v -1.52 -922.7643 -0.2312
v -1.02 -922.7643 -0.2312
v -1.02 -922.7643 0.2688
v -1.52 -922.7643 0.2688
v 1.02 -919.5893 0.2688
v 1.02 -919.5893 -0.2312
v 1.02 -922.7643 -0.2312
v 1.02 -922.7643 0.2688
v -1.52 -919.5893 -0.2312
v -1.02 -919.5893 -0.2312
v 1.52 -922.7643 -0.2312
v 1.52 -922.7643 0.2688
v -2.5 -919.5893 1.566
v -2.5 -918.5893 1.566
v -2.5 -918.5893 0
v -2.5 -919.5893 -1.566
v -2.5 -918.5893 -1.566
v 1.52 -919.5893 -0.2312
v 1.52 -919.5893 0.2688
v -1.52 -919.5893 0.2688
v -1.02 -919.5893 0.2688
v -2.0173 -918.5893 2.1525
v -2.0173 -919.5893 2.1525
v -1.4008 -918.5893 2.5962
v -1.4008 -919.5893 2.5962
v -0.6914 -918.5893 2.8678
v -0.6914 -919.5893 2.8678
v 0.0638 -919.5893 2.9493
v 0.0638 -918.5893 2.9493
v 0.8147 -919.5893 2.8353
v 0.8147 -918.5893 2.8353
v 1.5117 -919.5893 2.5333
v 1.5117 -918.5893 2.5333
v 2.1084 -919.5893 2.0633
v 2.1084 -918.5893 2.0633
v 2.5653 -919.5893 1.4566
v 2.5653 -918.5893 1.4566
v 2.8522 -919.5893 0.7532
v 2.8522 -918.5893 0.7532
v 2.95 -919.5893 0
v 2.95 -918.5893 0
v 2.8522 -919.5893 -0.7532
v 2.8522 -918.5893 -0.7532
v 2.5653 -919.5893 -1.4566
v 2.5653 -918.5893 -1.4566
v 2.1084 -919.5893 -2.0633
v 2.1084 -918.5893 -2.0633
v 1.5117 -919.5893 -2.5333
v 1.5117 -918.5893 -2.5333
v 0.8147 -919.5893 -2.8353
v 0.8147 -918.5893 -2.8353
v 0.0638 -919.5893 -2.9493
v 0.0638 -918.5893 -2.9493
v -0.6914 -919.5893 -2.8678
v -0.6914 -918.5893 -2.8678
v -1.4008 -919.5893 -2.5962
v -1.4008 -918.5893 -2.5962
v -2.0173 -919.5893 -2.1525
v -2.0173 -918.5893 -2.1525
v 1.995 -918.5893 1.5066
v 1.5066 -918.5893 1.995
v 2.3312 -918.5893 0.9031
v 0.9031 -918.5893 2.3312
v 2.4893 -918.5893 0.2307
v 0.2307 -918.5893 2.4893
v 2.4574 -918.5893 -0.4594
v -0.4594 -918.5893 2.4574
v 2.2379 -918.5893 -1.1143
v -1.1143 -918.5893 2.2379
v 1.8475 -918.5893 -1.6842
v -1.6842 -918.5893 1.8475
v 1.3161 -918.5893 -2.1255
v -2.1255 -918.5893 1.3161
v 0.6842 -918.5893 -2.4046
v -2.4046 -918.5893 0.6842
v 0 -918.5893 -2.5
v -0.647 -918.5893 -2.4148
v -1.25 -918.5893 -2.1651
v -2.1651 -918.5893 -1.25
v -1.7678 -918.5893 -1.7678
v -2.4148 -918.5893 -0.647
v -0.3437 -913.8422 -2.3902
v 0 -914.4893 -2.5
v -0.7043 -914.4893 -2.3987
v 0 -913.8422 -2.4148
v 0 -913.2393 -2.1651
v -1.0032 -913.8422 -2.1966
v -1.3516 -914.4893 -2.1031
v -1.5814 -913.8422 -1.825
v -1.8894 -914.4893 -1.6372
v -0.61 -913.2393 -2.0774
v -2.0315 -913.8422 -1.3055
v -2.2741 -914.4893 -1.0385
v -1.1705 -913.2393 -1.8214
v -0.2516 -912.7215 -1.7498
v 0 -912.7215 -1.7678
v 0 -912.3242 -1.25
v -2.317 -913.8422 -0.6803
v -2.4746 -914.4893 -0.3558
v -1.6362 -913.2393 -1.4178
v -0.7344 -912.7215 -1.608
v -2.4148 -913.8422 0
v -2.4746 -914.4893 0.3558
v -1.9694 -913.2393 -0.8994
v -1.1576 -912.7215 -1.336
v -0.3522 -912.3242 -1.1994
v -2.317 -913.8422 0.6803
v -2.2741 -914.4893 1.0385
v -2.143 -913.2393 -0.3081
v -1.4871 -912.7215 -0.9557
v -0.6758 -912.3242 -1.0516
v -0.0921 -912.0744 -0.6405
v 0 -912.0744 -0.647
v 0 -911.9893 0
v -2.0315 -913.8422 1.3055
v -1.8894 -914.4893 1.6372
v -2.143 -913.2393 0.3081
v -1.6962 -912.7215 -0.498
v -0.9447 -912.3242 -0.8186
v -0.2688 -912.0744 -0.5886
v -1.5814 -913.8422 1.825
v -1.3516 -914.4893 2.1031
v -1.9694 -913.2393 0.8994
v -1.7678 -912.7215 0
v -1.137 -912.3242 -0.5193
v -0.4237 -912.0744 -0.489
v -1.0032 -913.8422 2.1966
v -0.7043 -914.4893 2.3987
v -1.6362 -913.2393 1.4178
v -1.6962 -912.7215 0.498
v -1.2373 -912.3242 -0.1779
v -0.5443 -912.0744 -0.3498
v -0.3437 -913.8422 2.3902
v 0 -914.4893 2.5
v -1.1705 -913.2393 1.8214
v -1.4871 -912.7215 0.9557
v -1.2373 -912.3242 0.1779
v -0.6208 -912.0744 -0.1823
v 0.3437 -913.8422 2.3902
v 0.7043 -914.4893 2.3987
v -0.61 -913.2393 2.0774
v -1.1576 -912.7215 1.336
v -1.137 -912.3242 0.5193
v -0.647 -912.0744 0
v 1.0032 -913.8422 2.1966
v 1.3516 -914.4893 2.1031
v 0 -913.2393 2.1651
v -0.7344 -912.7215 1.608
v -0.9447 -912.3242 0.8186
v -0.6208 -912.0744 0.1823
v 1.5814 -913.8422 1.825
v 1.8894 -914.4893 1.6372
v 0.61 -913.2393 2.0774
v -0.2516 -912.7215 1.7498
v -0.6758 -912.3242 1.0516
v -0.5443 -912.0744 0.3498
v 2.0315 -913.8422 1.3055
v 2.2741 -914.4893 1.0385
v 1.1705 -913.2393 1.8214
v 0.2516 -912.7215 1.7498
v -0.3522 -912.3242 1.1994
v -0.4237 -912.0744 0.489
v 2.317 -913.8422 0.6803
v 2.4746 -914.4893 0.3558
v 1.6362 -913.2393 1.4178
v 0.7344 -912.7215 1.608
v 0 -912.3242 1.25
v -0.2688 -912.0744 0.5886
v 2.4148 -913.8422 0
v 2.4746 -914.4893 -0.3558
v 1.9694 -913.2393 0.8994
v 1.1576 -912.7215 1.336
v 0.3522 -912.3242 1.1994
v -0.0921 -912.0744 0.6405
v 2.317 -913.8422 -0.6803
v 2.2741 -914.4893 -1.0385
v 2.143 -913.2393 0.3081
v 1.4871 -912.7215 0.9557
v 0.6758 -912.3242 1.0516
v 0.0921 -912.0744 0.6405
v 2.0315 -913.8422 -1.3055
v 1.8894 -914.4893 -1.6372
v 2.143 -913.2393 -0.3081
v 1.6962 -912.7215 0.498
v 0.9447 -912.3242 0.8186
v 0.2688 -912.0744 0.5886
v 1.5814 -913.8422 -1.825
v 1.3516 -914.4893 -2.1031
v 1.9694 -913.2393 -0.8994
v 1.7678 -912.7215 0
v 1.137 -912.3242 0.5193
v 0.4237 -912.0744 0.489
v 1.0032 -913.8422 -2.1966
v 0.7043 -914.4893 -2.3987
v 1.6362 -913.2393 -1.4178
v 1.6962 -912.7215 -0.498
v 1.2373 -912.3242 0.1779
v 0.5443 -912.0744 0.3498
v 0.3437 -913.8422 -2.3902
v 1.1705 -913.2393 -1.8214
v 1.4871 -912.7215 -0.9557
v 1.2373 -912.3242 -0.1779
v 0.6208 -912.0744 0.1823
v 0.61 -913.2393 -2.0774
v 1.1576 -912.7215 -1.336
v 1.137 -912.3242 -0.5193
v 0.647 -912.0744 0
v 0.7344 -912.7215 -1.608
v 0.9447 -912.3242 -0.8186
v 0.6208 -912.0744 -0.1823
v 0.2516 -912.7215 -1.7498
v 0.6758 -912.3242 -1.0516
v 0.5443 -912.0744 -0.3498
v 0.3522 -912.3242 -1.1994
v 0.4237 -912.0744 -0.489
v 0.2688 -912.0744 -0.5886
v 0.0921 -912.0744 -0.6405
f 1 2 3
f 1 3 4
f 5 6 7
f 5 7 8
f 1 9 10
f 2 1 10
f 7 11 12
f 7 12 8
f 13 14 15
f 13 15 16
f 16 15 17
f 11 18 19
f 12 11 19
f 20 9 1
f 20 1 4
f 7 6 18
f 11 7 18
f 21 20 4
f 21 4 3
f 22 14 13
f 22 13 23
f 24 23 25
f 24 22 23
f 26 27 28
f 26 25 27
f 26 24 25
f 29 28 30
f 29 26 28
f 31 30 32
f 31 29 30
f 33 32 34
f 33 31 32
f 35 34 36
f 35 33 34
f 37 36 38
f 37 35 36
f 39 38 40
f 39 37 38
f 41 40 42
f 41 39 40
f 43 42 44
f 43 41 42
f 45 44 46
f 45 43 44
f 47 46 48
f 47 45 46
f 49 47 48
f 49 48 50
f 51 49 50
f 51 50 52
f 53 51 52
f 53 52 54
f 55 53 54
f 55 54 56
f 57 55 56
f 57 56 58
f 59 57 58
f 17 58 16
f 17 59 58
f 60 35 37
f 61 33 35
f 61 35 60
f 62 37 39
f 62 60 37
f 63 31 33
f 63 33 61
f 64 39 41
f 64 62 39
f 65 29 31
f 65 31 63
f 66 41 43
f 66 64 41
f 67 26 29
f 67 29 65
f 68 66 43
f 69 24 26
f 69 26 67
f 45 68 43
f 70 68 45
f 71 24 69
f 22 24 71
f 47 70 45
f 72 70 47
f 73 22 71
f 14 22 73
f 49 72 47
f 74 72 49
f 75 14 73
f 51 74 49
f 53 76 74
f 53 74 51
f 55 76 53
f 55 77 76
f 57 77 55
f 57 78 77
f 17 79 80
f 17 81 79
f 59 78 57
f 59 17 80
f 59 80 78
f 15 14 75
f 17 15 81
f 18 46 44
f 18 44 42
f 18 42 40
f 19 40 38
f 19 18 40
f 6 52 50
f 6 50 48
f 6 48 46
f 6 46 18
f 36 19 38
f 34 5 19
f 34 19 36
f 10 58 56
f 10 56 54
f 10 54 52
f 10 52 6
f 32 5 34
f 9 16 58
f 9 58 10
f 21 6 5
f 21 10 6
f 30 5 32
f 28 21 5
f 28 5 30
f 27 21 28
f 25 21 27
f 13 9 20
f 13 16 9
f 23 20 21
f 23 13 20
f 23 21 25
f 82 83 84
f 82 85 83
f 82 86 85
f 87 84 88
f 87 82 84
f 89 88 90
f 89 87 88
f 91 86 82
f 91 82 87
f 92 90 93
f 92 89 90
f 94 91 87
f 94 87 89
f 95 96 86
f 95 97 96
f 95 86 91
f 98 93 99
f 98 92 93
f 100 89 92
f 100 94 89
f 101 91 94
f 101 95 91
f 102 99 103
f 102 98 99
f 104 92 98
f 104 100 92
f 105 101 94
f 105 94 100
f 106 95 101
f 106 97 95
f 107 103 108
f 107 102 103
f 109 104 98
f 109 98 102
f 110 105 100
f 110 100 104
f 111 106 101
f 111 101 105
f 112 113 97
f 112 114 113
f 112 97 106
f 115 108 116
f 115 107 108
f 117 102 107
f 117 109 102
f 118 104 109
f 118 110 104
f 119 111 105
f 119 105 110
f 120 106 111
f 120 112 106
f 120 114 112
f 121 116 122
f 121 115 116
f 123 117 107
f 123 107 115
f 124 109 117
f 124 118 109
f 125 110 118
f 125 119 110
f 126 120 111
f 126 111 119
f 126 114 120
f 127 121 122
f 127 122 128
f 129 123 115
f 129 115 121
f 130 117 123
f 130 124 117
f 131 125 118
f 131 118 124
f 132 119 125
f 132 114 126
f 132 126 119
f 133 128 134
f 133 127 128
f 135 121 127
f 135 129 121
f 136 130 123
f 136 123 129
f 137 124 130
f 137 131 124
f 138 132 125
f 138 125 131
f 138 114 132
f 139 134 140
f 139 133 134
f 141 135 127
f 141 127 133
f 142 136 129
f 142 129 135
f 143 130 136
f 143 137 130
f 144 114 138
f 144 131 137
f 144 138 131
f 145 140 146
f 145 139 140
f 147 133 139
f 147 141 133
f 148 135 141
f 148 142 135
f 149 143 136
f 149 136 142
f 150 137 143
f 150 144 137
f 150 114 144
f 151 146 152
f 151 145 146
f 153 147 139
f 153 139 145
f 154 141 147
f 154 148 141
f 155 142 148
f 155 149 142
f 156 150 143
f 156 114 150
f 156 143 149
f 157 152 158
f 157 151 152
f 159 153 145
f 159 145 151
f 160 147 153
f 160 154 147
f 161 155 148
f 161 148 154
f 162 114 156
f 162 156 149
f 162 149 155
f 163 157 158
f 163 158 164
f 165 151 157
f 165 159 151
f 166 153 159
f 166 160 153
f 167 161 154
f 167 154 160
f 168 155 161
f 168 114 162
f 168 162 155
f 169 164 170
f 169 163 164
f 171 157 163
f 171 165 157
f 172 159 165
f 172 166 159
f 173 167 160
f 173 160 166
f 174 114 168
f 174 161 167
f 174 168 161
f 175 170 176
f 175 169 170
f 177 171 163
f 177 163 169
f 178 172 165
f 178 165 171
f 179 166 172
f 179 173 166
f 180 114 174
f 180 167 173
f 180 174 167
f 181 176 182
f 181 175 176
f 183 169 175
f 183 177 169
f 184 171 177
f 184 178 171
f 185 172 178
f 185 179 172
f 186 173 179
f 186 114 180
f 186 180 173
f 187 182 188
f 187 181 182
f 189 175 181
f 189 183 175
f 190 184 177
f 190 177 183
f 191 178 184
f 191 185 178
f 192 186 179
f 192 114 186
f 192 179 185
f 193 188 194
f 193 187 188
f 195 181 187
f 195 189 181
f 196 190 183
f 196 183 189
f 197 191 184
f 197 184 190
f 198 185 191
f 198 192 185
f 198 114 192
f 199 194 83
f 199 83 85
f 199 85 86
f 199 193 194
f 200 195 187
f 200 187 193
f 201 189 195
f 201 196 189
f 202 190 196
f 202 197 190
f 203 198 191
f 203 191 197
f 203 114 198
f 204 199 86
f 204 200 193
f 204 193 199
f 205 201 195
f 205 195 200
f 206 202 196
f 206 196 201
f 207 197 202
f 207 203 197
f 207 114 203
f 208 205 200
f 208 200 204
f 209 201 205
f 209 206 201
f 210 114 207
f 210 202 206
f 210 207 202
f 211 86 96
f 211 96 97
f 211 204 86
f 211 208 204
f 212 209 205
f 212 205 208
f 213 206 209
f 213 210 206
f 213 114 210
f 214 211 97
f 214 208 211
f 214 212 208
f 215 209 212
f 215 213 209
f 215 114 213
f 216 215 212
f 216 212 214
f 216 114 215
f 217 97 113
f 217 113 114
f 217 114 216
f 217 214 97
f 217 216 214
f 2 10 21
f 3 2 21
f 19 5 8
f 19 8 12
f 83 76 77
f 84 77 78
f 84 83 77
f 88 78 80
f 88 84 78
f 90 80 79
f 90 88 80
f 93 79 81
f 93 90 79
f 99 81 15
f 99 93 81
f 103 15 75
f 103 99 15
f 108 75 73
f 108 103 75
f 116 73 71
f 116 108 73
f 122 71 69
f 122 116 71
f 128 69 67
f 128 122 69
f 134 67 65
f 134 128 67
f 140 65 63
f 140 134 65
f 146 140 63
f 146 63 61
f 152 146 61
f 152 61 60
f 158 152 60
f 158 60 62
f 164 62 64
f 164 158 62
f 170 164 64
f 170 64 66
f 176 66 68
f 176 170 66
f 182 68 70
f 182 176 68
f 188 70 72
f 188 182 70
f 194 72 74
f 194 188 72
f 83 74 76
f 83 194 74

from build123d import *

# Parameters (mm, degrees)
CROQUIS3_W              = 0.5
CROQUIS3_H              = 0.5
SALIENTE_EXTRUIR3_DEPTH = 25.4
CROQUIS4_W              = 0.912534335
CROQUIS4_H              = 5.586103973
CORTAR_EXTRUIR1_DEPTH   = 25.4
CORTAR_EXTRUIR2_REACH   = 5.219
CROQUIS5_W              = 0.5
CROQUIS5_H              = 1
SKETCH1_W               = 3.04
SKETCH1_H               = 22.225
CUT_EXTRUDE1_DEPTH      = 4.181185999


with BuildPart() as part:
    # Croquis2 → Revolución1 (revolve)
    with BuildSketch(Plane(origin=(0, 0, 0), x_dir=(0, 0, -1), z_dir=(1, 0, 0))):
        with BuildLine():
            Line((0, -919.589259582), (2.95, -919.589259582))
            Line((2.95, -919.589259582), (2.95, -918.589259582))
            Line((2.95, -918.589259582), (2.5, -918.589259582))
            Line((2.5, -918.589259582), (2.5, -914.489259582))
            ThreePointArc((2.5, -914.489259582), (1.767766953, -912.721492629), (0, -911.989259582))
            Line((0, -911.989259582), (0, -919.589259582))
        make_face()
    revolve(axis=Axis((0, -1491.471633976, 0), (0, 1, 0)))

    # Croquis3 → Saliente-Extruir3 (add)
    with BuildSketch(Plane.XZ.offset(919.589259582)):
        with Locations((1.27, 0.018814001)):
            Rectangle(CROQUIS3_W, CROQUIS3_H)
        with Locations((-1.27, 0.018814001)):
            Rectangle(CROQUIS3_W, CROQUIS3_H)
    extrude(amount=SALIENTE_EXTRUIR3_DEPTH)

    # Croquis4 → Cortar-Extruir1 (cut)
    with BuildSketch(Plane(origin=(0, -918.589259582, 0), x_dir=(1, 0, 0), z_dir=(0, 1, 0))):
        with Locations((-2.956267168, 0.283432647)):
            Rectangle(CROQUIS4_W, CROQUIS4_H)
    extrude(amount=-CORTAR_EXTRUIR1_DEPTH, mode=Mode.SUBTRACT)

    # Croquis5 → Cortar-Extruir2 (cut, up to next)
    with BuildSketch(Plane.XY.offset(0.268814001), mode=Mode.PRIVATE) as cortar_extruir2_sk1:
        with Locations((-1.27, -944.489259582)):
            Rectangle(CROQUIS5_W, CROQUIS5_H)
    cortar_extruir2_tool1 = extrude(cortar_extruir2_sk1.sketch, amount=-CORTAR_EXTRUIR2_REACH, mode=Mode.PRIVATE) & part.part
    add(cortar_extruir2_tool1.solids().sort_by_distance((-1.27, -944.48926, 0.268814))[0], mode=Mode.SUBTRACT)

    # Sketch1 → Cut-Extrude1 (cut, through all)
    with BuildSketch(Plane(origin=(0, 0, -0.231185999), x_dir=(-1, 0, 0), z_dir=(0, 0, -1))):
        with Locations((0, -933.876759582)):
            Rectangle(SKETCH1_W, SKETCH1_H)
    extrude(amount=-CUT_EXTRUDE1_DEPTH, mode=Mode.SUBTRACT)


solid = part.part
